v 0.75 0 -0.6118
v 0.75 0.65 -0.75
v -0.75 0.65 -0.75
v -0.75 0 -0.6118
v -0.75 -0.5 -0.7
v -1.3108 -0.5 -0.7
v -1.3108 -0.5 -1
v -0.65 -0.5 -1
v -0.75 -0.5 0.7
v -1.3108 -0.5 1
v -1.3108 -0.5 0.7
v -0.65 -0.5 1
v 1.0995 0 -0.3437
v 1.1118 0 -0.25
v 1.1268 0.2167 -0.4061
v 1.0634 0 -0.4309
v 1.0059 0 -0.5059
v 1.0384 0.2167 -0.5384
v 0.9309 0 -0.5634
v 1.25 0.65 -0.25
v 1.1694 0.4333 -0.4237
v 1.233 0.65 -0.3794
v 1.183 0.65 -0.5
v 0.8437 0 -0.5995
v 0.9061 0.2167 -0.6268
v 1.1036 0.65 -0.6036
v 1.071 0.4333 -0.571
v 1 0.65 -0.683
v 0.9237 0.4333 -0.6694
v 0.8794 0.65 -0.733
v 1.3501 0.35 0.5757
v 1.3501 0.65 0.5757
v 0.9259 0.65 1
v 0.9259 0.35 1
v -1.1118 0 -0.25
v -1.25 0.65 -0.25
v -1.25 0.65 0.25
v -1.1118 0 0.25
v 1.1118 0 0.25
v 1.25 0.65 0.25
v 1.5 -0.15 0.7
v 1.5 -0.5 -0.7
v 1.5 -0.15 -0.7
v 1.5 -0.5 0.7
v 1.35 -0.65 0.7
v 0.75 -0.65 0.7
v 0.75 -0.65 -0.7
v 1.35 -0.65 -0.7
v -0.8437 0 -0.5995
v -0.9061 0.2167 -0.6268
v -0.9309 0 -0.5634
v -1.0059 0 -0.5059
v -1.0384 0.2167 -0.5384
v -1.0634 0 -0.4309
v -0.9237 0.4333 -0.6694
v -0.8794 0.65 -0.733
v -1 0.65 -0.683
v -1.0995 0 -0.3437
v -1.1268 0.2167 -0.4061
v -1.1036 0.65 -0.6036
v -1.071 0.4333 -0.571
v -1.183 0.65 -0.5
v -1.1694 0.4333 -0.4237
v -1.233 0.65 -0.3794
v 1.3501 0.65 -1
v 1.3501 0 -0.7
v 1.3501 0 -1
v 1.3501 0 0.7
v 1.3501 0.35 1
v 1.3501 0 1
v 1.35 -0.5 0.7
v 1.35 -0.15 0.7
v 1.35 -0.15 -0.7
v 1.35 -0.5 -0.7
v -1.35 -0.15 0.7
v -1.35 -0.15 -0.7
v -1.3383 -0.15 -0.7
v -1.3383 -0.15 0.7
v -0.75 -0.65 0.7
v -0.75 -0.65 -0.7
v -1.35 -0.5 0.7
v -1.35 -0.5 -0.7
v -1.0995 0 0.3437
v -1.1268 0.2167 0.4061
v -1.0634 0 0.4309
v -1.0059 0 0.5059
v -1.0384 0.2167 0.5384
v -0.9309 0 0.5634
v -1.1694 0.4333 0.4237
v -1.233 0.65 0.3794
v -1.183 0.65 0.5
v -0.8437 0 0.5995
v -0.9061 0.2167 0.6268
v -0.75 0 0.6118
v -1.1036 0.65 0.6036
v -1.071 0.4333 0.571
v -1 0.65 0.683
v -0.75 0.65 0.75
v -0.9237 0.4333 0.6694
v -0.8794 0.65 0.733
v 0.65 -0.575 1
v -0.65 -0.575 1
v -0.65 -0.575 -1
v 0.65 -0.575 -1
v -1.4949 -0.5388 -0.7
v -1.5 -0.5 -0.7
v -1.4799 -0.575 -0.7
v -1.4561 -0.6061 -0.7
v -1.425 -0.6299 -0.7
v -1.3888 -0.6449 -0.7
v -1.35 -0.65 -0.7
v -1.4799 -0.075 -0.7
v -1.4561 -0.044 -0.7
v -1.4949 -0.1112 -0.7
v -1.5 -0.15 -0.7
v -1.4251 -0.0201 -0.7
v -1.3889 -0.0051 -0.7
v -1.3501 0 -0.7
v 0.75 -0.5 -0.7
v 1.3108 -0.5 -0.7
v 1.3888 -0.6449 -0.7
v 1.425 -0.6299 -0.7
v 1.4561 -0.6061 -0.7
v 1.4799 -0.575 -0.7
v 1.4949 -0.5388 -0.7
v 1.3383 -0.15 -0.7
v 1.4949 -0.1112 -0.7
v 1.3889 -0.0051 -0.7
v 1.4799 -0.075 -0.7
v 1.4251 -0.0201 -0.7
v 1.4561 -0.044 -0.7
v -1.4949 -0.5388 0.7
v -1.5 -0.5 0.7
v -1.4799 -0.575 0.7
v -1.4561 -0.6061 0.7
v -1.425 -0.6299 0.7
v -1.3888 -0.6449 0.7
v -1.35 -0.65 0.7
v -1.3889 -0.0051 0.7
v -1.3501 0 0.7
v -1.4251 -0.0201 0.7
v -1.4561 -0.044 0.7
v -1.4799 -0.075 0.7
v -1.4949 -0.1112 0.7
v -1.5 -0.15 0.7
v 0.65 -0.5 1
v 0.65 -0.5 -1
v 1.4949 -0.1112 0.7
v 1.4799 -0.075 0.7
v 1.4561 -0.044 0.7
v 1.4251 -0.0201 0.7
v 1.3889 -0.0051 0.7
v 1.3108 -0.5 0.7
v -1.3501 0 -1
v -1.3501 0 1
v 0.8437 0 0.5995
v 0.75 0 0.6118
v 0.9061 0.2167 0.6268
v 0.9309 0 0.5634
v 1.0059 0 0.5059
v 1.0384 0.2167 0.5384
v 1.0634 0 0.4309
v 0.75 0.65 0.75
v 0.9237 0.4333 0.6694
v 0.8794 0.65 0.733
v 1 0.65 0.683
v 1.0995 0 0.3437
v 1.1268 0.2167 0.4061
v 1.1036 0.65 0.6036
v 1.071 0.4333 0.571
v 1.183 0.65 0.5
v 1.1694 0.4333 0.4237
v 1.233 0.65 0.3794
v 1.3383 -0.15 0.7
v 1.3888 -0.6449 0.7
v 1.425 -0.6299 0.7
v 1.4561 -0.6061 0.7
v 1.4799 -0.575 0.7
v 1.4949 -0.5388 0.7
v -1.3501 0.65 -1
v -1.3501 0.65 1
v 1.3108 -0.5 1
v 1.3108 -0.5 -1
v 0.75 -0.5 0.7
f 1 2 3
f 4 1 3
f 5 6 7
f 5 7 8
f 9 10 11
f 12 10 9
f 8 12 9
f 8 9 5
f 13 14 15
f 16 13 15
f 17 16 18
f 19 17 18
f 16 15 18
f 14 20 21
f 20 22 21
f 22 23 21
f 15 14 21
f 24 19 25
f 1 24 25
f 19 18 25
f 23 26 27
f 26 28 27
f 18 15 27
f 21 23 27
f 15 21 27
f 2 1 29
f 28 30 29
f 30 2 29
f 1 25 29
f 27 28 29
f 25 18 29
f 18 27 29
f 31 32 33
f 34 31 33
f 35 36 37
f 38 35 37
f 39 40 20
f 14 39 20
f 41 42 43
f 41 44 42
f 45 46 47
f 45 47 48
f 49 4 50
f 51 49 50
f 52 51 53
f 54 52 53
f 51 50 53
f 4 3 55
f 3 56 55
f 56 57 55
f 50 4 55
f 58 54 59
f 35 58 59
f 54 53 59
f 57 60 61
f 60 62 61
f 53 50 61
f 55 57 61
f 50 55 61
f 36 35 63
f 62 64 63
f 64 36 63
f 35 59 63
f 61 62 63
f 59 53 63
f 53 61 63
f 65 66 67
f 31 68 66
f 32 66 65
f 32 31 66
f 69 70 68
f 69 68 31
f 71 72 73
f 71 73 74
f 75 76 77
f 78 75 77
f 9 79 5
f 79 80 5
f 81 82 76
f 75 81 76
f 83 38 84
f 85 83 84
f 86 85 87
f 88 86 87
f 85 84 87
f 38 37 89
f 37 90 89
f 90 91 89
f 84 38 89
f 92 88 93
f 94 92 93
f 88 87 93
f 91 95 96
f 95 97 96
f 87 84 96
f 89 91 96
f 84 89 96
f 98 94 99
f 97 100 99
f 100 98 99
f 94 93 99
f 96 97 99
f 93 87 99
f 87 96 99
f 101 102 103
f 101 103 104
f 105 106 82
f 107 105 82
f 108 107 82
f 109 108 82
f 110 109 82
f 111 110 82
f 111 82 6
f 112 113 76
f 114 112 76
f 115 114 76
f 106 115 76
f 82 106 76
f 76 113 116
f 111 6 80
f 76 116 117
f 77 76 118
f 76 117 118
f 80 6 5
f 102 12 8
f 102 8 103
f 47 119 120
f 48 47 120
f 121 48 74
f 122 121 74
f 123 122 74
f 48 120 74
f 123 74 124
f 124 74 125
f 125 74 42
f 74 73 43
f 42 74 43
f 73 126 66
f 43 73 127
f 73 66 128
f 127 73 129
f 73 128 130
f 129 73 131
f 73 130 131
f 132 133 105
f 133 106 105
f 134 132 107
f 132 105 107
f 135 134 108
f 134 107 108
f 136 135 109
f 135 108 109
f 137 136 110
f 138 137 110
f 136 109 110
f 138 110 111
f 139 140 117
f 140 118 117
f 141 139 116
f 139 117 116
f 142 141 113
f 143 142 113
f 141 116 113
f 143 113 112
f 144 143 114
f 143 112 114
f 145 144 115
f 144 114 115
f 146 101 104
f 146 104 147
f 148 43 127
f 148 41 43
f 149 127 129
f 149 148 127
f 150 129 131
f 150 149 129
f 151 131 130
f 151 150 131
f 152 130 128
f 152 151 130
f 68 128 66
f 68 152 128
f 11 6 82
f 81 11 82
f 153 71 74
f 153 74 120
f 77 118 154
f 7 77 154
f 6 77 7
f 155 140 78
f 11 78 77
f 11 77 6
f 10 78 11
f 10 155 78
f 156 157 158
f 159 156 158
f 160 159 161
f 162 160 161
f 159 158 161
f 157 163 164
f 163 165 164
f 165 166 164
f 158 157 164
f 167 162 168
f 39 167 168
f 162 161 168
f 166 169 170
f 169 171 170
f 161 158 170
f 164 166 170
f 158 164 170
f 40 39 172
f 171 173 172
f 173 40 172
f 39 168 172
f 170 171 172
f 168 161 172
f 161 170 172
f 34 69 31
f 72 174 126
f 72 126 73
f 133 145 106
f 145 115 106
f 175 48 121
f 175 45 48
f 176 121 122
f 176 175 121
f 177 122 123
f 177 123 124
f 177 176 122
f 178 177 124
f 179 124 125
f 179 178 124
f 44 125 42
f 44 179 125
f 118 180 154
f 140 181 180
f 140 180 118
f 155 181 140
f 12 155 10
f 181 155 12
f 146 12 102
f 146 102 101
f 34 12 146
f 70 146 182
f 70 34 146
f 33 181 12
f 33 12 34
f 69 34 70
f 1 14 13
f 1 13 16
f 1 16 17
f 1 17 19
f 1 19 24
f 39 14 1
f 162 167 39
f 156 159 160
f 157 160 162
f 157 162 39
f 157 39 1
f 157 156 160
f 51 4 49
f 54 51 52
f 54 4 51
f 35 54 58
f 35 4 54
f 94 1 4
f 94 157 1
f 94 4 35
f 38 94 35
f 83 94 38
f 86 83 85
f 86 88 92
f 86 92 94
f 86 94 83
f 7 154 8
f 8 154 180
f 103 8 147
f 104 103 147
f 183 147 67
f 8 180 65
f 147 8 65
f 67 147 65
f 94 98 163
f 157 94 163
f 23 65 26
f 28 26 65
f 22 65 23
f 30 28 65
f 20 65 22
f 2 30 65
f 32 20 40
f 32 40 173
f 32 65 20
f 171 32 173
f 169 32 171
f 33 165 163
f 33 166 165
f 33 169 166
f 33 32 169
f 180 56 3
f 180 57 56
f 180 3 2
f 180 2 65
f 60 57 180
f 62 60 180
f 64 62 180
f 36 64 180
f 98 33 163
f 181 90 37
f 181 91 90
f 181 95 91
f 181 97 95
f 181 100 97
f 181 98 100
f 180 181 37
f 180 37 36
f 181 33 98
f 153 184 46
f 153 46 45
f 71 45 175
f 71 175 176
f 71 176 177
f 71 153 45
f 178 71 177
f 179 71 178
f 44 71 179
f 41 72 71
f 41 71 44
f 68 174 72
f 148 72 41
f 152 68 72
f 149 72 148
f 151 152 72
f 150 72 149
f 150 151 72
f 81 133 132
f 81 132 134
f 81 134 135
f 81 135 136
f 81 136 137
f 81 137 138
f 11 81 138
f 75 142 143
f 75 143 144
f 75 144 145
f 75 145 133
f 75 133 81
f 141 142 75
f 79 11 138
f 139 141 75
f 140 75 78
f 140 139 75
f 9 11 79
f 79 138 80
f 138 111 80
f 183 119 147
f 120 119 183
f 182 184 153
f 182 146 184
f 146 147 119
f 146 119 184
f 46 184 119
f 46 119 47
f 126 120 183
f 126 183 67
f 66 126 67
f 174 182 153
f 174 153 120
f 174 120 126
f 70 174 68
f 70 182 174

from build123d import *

# Parameters (mm, degrees)
EXTRUDE1_DEPTH     = 1
CUT_EXTRUDE1_DEPTH = 0.65
CUT_EXTRUDE1_DRAFT = -12
EXTRUDE2_DEPTH     = 0.7
CUT_EXTRUDE2_DEPTH = 0.3


with BuildPart() as part:
    # Sketch1 → Extrude1 (new body, symmetric)
    with BuildSketch(Plane.XY):
        Polygon((1.3501308, 0.65), (-1.3501308, 0.65), (-1.3501308, 0), (-1.310779947, -0.5), (-0.65, -0.5), (-0.65, -0.575), (0.65, -0.575), (0.65, -0.5), (1.310779947, -0.5), (1.3501308, 0), align=None)
    extrude(amount=EXTRUDE1_DEPTH, both=True)


with BuildPart() as cut_extrude1_tool:
    # Sketch4 → Cut-Extrude1 (with draft: the straight prism first)
    with BuildSketch(Plane(origin=(0, 0.65, 0), x_dir=(-1, 0, 0), z_dir=(0, 1, 0))):
        with BuildLine():
            ThreePointArc((0.75, -0.75), (1.103553391, -0.603553391), (1.25, -0.25))
            Line((1.25, -0.25), (1.25, 0.25))
            ThreePointArc((1.25, 0.25), (1.103553391, 0.603553391), (0.75, 0.75))
            Line((0.75, 0.75), (-0.75, 0.75))
            ThreePointArc((-0.75, 0.75), (-1.103553391, 0.603553391), (-1.25, 0.25))
            Line((-1.25, 0.25), (-1.25, -0.25))
            ThreePointArc((-1.25, -0.25), (-1.103553391, -0.603553391), (-0.75, -0.75))
            Line((-0.75, -0.75), (0.75, -0.75))
        make_face()
    extrude(amount=-CUT_EXTRUDE1_DEPTH)
    # Cut-Extrude1: the draft: its side faces are tilted about the plane it starts from
    cut_extrude1_sides = [cut_extrude1_tool.faces().sort_by_distance(p)[0] for p in [
        (1.103553391, 0.325, -0.603553391),
        (0, 0.325, -0.75),
        (-1.103553391, 0.325, -0.603553391),
        (-1.25, 0.325, 0),
        (-1.103553391, 0.325, 0.603553391),
        (0, 0.325, 0.75),
        (1.103553391, 0.325, 0.603553391),
        (1.25, 0.325, 0),
    ]]
    draft(cut_extrude1_sides, Plane(origin=(0, 0.65, 0), x_dir=(-1, 0, 0), z_dir=(0, 1, 0)), CUT_EXTRUDE1_DRAFT)


with BuildPart() as part_1:
    add(part.part)

    # Cut-Extrude1: cut by cut_extrude1_tool
    add(cut_extrude1_tool.part, mode=Mode.SUBTRACT)

    # Sketch1_3 → Extrude2 (add, symmetric)
    with BuildSketch(Plane.XY):
        with BuildLine():
            Line((-1.338325544, -0.15), (-1.3501308, 0))
            ThreePointArc((-1.3501308, -5.7e-08), (-1.456112252, -0.043980238), (-1.5, -0.15))
            Line((-1.5, -0.15), (-1.5, -0.5))
            ThreePointArc((-1.5, -0.5), (-1.456066017, -0.606066017), (-1.35, -0.65))
            Line((-1.35, -0.65), (-0.75, -0.65))
            Line((-0.75, -0.65), (-0.75, -0.5))
            Line((-0.75, -0.5), (-1.35, -0.5))
            Line((-1.35, -0.5), (-1.35, -0.15))
            Line((-1.35, -0.15), (-1.338325544, -0.15))
        make_face()
        with BuildLine():
            ThreePointArc((1.5, -0.15), (1.456112252, -0.043980238), (1.3501308, -5.7e-08))
            Line((1.3501308, 0), (1.338325544, -0.15))
            Line((1.338325544, -0.15), (1.35, -0.15))
            Line((1.35, -0.15), (1.35, -0.5))
            Line((1.35, -0.5), (0.75, -0.5))
            Line((0.75, -0.5), (0.75, -0.65))
            Line((0.75, -0.65), (1.35, -0.65))
            ThreePointArc((1.35, -0.65), (1.456066017, -0.606066017), (1.5, -0.5))
            Line((1.5, -0.5), (1.5, -0.15))
        make_face()
    extrude(amount=EXTRUDE2_DEPTH, both=True)

    # Sketch4_5 → Cut-Extrude2 (cut)
    with BuildSketch(Plane(origin=(0, 0.65, 0), x_dir=(-1, 0, 0), z_dir=(0, 1, 0))):
        Polygon((-1.3501308, 1), (-1.3501308, 0.575735931), (-0.925866731, 1), align=None)
    extrude(amount=-CUT_EXTRUDE2_DEPTH, mode=Mode.SUBTRACT)


solid = part_1.part
